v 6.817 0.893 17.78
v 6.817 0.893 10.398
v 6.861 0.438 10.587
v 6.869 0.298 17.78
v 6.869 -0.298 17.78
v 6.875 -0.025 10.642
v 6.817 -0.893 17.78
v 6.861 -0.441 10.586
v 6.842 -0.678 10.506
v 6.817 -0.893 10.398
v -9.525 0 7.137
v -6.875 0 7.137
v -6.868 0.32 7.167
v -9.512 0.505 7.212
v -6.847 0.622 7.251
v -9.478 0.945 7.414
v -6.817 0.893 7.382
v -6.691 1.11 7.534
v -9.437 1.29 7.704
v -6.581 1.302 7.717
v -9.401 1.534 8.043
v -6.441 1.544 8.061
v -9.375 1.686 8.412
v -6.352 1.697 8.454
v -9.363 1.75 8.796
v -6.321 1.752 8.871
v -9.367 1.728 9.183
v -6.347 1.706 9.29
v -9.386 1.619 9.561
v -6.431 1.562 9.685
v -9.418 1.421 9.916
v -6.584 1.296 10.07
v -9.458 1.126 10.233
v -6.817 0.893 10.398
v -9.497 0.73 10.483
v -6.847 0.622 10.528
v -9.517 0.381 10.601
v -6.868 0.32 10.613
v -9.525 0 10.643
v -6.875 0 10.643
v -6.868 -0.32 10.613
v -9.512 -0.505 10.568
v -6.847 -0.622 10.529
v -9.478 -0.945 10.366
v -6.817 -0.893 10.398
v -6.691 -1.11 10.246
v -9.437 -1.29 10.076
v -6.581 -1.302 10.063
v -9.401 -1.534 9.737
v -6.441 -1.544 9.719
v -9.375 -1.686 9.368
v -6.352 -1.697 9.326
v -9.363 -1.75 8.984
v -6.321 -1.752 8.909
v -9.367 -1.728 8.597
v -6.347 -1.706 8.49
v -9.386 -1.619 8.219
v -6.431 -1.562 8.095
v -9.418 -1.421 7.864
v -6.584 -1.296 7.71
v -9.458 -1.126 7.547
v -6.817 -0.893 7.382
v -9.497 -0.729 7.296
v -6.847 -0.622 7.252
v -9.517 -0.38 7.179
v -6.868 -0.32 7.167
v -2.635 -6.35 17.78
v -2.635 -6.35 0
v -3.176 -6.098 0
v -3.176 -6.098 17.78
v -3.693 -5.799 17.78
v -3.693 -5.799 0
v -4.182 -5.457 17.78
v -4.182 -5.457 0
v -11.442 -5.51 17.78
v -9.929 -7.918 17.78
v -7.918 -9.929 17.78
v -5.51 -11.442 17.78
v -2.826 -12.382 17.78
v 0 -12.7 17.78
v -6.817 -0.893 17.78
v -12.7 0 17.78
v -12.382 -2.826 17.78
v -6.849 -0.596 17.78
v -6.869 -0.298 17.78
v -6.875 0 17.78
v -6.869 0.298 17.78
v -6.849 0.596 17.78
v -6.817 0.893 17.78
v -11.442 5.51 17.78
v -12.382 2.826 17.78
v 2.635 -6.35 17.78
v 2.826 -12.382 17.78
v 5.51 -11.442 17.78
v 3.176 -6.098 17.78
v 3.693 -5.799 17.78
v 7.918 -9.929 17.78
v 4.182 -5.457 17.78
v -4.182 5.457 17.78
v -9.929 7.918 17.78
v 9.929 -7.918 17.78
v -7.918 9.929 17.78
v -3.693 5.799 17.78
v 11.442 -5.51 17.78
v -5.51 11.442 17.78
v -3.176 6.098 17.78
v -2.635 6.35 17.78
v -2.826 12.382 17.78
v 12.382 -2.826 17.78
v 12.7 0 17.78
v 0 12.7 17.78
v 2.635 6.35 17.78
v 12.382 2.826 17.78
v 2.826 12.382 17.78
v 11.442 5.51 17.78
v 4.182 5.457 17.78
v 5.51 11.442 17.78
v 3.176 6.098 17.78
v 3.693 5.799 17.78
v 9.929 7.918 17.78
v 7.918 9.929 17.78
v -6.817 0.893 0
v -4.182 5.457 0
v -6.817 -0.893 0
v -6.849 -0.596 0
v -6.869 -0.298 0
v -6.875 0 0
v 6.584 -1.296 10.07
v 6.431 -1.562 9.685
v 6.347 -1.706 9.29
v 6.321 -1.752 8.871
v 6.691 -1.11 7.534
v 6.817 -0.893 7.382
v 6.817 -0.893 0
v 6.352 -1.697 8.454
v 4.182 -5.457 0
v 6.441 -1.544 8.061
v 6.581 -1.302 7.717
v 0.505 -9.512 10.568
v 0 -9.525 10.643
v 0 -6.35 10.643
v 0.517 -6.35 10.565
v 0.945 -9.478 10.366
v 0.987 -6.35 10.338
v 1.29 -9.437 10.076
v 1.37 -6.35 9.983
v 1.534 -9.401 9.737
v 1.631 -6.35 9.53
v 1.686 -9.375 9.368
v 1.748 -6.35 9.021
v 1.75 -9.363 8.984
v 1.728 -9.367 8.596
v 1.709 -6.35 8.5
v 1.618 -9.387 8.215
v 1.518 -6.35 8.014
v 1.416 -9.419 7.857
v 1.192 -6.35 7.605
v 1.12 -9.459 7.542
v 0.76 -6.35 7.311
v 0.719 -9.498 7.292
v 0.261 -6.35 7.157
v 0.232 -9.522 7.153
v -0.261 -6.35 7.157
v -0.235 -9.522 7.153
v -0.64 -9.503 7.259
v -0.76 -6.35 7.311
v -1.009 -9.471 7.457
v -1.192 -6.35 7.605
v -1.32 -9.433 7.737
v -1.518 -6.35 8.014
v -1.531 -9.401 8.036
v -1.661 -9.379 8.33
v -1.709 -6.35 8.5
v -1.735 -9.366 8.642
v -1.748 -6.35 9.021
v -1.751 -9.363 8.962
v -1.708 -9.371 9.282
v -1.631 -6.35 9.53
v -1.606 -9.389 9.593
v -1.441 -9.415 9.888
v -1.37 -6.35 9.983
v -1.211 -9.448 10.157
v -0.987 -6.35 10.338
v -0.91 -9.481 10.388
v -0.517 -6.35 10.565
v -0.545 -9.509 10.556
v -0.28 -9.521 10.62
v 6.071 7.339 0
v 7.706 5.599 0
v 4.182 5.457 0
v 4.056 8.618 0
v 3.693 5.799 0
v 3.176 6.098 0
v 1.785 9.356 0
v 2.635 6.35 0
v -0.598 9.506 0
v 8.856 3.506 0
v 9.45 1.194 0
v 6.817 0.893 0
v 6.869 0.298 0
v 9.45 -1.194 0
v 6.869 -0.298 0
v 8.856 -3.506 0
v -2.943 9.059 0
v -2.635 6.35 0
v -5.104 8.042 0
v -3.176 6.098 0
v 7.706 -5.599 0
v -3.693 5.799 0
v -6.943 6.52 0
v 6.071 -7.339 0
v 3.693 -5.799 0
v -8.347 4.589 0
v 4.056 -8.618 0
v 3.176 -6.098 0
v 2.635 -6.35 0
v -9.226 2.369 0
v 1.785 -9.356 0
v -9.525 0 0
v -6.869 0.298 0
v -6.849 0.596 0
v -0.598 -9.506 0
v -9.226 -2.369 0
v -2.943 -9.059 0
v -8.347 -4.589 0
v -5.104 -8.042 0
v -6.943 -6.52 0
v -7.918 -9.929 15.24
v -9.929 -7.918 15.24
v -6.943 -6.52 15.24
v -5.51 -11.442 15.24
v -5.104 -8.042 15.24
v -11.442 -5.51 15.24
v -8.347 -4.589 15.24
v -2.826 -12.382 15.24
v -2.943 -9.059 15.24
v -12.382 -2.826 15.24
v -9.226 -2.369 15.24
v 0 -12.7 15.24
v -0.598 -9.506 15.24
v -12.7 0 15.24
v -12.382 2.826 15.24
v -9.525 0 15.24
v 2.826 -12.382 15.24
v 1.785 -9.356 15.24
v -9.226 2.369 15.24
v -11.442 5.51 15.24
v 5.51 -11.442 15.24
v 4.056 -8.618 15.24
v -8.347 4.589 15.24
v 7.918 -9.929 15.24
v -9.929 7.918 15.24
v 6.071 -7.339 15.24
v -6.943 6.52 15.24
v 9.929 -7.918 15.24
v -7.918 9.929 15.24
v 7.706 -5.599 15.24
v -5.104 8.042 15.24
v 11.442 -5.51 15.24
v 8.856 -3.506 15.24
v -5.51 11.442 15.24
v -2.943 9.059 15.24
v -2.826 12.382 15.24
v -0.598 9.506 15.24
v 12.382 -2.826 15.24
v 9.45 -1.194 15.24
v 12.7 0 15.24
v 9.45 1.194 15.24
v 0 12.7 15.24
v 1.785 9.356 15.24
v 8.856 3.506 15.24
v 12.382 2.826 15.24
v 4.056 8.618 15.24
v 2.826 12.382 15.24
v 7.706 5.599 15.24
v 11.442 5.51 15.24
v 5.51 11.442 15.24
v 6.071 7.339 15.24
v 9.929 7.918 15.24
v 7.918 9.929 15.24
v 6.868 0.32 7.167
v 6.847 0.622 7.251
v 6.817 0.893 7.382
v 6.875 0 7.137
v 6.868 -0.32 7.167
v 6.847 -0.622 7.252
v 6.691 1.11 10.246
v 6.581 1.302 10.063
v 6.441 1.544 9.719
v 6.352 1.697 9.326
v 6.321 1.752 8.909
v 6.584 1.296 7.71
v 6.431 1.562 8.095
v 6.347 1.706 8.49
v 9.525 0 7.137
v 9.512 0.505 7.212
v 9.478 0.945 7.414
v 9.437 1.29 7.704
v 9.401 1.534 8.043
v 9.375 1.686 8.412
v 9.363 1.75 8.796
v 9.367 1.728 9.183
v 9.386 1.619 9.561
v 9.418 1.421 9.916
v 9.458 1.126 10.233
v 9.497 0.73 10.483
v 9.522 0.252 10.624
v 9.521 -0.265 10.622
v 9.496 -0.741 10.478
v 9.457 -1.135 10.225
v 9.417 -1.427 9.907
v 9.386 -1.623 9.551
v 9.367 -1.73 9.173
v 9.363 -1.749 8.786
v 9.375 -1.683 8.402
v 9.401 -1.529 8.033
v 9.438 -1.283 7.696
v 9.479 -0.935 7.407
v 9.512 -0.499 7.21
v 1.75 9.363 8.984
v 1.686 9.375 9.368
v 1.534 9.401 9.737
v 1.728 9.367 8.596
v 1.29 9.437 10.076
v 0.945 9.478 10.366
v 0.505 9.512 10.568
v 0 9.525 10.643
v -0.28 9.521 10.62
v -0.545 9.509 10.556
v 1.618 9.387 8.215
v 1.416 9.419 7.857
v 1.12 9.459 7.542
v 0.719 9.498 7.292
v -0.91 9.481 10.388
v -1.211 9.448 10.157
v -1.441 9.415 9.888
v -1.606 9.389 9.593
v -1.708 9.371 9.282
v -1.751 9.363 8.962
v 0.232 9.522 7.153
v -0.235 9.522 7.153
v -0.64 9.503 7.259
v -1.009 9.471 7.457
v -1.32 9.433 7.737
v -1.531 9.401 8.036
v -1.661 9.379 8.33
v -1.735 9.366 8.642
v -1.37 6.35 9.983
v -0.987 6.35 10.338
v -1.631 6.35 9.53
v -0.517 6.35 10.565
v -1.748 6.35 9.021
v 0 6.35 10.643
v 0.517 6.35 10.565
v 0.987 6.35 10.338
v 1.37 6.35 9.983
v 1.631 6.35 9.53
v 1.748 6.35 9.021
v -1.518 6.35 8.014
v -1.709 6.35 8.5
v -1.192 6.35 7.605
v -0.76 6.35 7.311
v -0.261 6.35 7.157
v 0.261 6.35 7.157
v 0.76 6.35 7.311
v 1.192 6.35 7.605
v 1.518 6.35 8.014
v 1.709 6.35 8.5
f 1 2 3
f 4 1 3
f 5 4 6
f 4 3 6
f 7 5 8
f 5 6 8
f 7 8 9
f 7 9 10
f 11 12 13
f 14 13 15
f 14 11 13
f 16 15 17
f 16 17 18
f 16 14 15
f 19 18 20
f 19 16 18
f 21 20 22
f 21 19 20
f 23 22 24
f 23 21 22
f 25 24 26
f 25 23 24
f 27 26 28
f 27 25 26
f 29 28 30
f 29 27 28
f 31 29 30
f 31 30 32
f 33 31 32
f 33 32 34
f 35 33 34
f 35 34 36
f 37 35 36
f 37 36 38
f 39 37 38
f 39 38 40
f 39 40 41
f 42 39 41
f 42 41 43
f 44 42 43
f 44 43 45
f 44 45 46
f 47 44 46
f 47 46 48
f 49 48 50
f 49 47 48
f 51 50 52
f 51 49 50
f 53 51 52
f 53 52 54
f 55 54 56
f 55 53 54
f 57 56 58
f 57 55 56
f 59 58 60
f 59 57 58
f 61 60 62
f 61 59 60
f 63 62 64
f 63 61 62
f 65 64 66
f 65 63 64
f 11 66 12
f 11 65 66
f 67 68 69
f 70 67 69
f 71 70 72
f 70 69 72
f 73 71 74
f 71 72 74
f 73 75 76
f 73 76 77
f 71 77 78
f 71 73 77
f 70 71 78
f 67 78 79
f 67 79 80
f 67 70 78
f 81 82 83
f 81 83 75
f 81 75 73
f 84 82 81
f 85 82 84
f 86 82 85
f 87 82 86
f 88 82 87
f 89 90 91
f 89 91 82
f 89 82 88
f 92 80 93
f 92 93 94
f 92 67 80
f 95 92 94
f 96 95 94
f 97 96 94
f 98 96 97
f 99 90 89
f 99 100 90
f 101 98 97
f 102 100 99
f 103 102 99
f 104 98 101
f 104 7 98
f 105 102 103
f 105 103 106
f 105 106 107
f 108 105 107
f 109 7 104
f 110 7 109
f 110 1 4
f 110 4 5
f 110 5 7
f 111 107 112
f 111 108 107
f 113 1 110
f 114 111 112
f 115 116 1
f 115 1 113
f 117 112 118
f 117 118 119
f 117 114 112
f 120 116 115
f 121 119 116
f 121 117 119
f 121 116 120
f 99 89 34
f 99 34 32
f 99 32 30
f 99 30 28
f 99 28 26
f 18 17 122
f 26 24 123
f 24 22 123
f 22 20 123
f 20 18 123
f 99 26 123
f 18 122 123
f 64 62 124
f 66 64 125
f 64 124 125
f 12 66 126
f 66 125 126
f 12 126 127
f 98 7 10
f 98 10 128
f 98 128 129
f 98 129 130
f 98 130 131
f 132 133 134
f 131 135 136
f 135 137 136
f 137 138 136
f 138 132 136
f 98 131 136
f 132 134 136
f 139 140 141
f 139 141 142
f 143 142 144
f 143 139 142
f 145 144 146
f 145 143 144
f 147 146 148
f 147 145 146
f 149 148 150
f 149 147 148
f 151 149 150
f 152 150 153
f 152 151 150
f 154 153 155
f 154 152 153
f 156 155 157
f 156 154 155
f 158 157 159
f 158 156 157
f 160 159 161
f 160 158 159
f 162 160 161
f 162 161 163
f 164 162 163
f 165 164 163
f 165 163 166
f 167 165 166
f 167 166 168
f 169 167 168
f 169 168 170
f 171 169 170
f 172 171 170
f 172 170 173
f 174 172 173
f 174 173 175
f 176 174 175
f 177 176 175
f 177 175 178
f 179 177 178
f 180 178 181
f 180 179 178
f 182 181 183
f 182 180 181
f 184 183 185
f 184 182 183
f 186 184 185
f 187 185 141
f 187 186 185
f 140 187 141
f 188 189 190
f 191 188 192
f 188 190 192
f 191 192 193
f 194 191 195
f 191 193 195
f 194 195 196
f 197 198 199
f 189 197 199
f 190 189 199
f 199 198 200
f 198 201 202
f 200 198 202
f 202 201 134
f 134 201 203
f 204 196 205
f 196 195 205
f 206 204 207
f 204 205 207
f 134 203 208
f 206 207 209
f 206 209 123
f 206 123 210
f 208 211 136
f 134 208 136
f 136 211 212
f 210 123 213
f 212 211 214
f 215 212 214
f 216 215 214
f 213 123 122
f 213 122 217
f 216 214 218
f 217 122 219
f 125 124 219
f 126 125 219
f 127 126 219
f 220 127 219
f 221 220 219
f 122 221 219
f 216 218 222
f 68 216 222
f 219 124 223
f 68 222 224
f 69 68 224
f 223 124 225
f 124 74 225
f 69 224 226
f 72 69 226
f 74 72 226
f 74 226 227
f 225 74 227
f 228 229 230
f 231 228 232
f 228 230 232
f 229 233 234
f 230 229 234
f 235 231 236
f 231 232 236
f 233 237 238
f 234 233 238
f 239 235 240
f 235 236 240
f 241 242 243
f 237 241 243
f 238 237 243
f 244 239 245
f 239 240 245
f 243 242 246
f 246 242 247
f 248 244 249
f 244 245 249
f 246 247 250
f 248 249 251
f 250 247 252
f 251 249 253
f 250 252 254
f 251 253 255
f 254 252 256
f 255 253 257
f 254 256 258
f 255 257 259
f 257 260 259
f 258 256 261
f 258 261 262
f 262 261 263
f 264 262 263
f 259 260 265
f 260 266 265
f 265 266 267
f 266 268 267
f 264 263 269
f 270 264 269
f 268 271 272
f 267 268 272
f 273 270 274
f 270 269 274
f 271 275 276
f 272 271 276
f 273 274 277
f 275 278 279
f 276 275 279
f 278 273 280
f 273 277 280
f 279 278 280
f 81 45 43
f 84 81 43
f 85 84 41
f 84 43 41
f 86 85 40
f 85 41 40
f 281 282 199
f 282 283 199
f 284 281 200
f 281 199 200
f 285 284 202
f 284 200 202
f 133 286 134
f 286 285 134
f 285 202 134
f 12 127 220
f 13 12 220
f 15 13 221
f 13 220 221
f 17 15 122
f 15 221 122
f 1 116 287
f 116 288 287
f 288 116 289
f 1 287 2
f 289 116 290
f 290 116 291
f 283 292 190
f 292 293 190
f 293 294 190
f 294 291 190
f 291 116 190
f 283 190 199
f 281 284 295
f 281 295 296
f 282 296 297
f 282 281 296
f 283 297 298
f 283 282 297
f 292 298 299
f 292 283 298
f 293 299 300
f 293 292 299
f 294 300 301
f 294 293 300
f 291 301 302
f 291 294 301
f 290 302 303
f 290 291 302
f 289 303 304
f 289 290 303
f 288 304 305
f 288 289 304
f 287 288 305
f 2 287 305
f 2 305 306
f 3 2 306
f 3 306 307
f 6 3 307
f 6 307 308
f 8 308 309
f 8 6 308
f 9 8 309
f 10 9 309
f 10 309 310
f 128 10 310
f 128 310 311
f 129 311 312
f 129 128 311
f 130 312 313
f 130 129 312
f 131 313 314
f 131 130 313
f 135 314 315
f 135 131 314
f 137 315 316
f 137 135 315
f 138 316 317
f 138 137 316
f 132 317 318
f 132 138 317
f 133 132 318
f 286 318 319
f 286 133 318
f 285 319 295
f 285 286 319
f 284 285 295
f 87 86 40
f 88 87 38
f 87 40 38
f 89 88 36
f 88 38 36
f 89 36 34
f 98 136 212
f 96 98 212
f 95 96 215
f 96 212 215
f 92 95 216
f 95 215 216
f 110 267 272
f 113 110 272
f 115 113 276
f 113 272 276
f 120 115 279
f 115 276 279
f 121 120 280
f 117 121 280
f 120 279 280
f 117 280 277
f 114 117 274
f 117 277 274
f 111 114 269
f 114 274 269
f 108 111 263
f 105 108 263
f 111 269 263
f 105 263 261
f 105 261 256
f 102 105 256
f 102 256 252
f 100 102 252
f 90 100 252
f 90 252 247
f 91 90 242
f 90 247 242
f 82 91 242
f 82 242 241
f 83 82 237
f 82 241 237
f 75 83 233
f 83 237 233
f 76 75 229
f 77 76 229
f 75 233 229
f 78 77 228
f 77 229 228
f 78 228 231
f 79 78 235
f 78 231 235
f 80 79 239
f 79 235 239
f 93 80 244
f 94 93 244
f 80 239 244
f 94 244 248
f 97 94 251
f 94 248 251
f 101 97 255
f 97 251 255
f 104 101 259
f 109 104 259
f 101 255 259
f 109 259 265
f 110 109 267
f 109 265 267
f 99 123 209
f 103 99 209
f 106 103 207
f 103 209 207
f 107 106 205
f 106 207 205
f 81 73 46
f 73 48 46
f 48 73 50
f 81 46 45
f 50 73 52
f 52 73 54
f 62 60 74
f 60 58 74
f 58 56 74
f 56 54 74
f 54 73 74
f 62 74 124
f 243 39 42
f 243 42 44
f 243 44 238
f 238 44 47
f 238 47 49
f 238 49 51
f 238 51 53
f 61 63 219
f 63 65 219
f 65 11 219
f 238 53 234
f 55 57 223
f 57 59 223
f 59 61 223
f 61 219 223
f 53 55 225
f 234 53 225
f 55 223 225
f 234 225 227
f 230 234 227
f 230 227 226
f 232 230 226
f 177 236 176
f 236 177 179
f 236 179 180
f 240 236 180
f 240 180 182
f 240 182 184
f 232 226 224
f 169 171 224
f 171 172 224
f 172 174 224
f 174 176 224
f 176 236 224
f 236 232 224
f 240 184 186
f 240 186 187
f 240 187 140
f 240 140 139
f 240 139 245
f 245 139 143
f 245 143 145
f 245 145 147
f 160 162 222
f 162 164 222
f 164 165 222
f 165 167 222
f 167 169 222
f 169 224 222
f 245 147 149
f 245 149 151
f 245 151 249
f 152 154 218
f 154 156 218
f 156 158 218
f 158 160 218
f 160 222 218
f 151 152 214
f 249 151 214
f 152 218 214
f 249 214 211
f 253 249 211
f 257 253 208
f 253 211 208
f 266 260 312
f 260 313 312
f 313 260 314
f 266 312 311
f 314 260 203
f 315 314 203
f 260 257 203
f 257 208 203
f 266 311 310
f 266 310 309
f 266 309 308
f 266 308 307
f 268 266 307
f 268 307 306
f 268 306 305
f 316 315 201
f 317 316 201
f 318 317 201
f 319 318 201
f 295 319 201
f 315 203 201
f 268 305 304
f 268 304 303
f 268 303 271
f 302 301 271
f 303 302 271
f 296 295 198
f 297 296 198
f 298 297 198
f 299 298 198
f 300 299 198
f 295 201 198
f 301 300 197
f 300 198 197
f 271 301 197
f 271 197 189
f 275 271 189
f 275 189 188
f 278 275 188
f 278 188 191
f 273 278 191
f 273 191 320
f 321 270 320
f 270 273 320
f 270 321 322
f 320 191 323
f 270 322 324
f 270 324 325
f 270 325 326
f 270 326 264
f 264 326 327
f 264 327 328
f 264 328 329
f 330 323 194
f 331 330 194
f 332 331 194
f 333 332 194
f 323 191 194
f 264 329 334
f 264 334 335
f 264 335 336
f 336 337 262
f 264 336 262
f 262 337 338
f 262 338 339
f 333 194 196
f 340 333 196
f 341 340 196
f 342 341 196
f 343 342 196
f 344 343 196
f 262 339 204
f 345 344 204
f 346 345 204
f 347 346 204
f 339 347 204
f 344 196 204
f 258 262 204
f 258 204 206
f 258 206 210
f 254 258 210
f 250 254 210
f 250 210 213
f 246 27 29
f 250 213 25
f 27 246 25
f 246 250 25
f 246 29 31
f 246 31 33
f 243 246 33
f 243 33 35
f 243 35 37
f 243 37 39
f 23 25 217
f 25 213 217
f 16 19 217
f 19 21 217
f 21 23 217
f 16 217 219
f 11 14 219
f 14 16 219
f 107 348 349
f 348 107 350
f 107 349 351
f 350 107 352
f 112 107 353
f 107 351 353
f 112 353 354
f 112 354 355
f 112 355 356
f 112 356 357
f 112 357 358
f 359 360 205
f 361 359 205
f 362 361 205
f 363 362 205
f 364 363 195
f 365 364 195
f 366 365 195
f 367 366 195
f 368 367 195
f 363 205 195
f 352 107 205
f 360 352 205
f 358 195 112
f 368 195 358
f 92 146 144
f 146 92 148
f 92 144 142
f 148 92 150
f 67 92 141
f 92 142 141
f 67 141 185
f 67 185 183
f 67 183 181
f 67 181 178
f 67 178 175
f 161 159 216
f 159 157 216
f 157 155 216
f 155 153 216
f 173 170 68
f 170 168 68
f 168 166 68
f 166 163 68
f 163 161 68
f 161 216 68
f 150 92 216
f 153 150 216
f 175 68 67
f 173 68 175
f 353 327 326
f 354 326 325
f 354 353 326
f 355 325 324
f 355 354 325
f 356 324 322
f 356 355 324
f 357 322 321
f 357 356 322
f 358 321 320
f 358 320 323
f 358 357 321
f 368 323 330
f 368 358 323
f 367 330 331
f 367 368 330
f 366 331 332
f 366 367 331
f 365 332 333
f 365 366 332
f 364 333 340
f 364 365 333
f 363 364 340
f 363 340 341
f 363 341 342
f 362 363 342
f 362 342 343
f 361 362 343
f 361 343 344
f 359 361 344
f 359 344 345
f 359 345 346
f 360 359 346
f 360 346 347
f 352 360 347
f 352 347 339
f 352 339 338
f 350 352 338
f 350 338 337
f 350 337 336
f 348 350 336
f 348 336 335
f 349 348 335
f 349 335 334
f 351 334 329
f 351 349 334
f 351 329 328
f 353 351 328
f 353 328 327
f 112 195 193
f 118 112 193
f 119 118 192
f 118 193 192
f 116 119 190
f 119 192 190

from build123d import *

# Parameters (mm, degrees)
SKETCH5_R               = 9.525
BOSS_EXTRUDE1_DEPTH     = 15.24
SKETCH6_R               = 12.7
BOSS_EXTRUDE2_DEPTH     = 2.54
CUT_EXTRUDE1_DEPTH      = 26.272680903
CUT_EXTRUDE3_DEPTH      = 26.272680903
CUT_EXTRUDE3_DEPTH_BACK = 26.272680903
SKETCH8_R               = 1.7526
CUT_EXTRUDE4_DEPTH      = 26.272680973
CUT_EXTRUDE4_DEPTH_BACK = 26.272680973
SKETCH9_R               = 1.7526


with BuildPart() as part:
    # Sketch5 → Boss-Extrude1 (new body)
    with BuildSketch(Plane.XY):
        with Locations(Location((0, 0, 0), (0, 0, 180))):
            Circle(SKETCH5_R)
    extrude(amount=BOSS_EXTRUDE1_DEPTH)

    # Sketch6 → Boss-Extrude2 (add)
    with BuildSketch(Plane.XY.offset(15.24)):
        Circle(SKETCH6_R)
    extrude(amount=BOSS_EXTRUDE2_DEPTH)

    # Sketch7 → Cut-Extrude1 (cut, through all)
    with BuildSketch(Plane(origin=(0, 0, 0), x_dir=(-1, 0, 0), z_dir=(0, 0, -1))):
        with BuildLine():
            ThreePointArc((4.181770846, 5.456960429), (3.437499983, 5.953924622), (2.634980936, 6.35))
            Line((2.634980936, 6.35), (-2.634980936, 6.35))
            ThreePointArc((-2.634980936, 6.35), (-3.437499983, 5.953924622), (-4.181770846, 5.456960429))
            Line((-4.181770846, 5.456960429), (-6.816751782, 0.893039571))
            ThreePointArc((-6.816751782, 0.893039571), (-6.874999966, 0), (-6.816751782, -0.893039571))
            Line((-6.816751782, -0.893039571), (-4.181770846, -5.456960429))
            ThreePointArc((-4.181770846, -5.456960429), (-3.437499983, -5.953924622), (-2.634980936, -6.35))
            Line((-2.634980936, -6.35), (2.634980936, -6.35))
            ThreePointArc((2.634980936, -6.35), (3.437499983, -5.953924622), (4.181770846, -5.456960429))
            Line((4.181770846, -5.456960429), (6.816751782, -0.893039571))
            ThreePointArc((6.816751782, -0.893039571), (6.860422465, -0.447468582), (6.874999966, 0))
            ThreePointArc((6.874999966, 0), (6.860422465, 0.447468582), (6.816751782, 0.893039571))
            Line((6.816751782, 0.893039571), (4.181770846, 5.456960429))
        make_face()
    extrude(amount=-CUT_EXTRUDE1_DEPTH, mode=Mode.SUBTRACT)

    # Sketch8 → Cut-Extrude3 (cut, two sides: drawn at the far end of the back side and taken through both)
    with BuildSketch(Plane(origin=(0, 0, 0), x_dir=(0, 0, -1), z_dir=(1, 0, 0)).offset(-CUT_EXTRUDE3_DEPTH_BACK)):
        with Locations((-8.89, 0)):
            Circle(SKETCH8_R)
    extrude(amount=CUT_EXTRUDE3_DEPTH + CUT_EXTRUDE3_DEPTH_BACK, mode=Mode.SUBTRACT)

    # Sketch9 → Cut-Extrude4 (cut, two sides: drawn at the far end of the back side and taken through both)
    with BuildSketch(Plane(origin=(0, 0, 0), x_dir=(1, 0, 0), z_dir=(0, 1, 0)).offset(-CUT_EXTRUDE4_DEPTH_BACK)):
        with Locations(Location((0, -8.89, 0), (0, 0, 270))):
            Circle(SKETCH9_R)
    extrude(amount=CUT_EXTRUDE4_DEPTH + CUT_EXTRUDE4_DEPTH_BACK, mode=Mode.SUBTRACT)


solid = part.part
